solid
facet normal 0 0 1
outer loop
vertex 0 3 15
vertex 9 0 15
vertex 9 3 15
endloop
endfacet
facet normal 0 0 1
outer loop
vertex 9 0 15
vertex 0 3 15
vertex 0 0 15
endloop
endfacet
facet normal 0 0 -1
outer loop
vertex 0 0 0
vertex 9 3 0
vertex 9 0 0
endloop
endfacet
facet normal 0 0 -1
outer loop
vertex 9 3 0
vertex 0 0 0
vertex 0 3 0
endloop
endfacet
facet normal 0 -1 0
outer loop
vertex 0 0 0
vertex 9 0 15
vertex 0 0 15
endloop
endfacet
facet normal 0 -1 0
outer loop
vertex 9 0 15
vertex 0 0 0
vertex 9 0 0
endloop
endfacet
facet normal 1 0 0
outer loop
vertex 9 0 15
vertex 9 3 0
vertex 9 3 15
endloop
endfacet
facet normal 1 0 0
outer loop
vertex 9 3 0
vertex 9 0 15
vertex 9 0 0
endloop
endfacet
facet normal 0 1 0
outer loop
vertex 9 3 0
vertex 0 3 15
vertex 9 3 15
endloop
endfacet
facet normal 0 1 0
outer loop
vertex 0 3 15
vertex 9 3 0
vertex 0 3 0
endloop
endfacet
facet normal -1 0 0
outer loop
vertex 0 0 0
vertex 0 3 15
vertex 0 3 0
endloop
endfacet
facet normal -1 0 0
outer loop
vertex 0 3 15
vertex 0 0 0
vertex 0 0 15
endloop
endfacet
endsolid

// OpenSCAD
// Generated by SolidPython 1.0.1 on 2020-07-29 00:46:55


cube(size = [9, 3, 15]);
/***********************************************
*********      SolidPython code:      **********
************************************************
 
# import packages: SolidPython
from solid import *
from solid.utils import *
from itertools import chain, combinations, permutations


class Resize:

    def __init__(self, scad_file):
        self.scad_file = scad_file
        #self.scad_file = import_scad(scad_file)
        # cone/cylinder param:
        self.r1 = 0
        self.r2 = 0
        self.h = 0
        # rectangular prism param:
        self.w = 0
        self.l = 0
        # ellipse param:
        self.r = 0

    # import OpenScad code (file name corresponds to shape)


    # classify shape + parameters
    def assign(self, param1, param2, param3):
        if self.scad_file == 'cone.scad':
            self.r1 = param1
            self.r2 = param2
            self.h = param3
        elif self.scad_file == 'cylinder.scad':
            self.r1 = param1
            self.r2 = param2
            self.h = param3
        elif self.scad_file == 'rectangularPrism.scad':
            self.h = param1
            self.l = param2
            self.w = param3
        else:
            self.r = param1
            self.h = param2

    # resize parameters
    def iterate(self):
        x = range(3, 20, 2)
        i = 1
        if self.scad_file == 'cone.scad':
            tempList = list(permutations(x, 2))
            for temp in tempList:
                param1 = temp[0]
                param2 = temp[1]
                filepath = 'produced_scad_files/' + 'cone' + str(param1) + '_' + str(param2) + '_' + '.scad'
                scad_render_to_file(cylinder(h=param1, r1=param2, r2=0), filepath)

        elif self.scad_file == 'cylinder.scad':
            tempList = list(permutations(x, 3))
            for temp in tempList:
                param1 = temp[0]
                param2 = temp[1]
                filepath = 'produced_scad_files/' + 'cylinder' + str(param1) + '_' + str(param2) + '_' + '.scad'
                scad_render_to_file(cylinder(h=param1, r1=param2, r2=param2), filepath)

        elif self.scad_file == 'rectangularPrism.scad':
            tempList = list(permutations(x, 3))
            for temp in tempList:
                param1 = temp[0]
                param2 = temp[1]
                param3 = temp[2]
                filepath = 'produced_scad_files/' + 'rectangularPrism' + str(param1) + '_' + str(param2) + '_' + str(
                    param3) + '.scad'
                scad_render_to_file(cube(size=(param1, param2, param3)), filepath)

        elif self.scad_file == 'ellipse.scad':
            tempList = list(permutations(x, 4))
            for temp in tempList:
                param1 = temp[0]
                param2 = temp[1]
                param3 = temp[2]
                param4 = temp[3]
                filepath = 'produced_scad_files/' + 'ellipse' + str(param1) + '_' + str(param2) + '_' + str(param3) + '_' + str(param4) + '.scad'
                scad_render_to_file(scale([param1, param2, param3])(sphere(r=param4)), filepath)

    def render_to_scadfile(self):
        scad_render_to_file(scad, 'example.scad') 
 
************************************************/
